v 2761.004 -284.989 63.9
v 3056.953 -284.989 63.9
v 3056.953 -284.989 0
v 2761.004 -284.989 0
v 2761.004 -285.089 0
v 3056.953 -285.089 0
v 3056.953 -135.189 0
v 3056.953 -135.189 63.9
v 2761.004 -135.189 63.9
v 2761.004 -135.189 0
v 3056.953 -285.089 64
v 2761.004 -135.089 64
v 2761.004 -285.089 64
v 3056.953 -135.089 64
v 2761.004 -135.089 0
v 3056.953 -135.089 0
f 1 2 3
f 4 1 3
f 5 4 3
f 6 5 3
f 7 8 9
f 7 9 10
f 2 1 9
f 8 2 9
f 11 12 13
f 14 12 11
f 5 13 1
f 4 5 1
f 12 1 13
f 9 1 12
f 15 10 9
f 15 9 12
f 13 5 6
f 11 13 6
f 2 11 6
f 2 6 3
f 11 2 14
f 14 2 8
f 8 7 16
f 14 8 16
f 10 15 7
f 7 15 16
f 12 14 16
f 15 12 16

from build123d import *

# Parameters (mm, degrees)
SKETCH_1_W          = 295.949422796
SKETCH_1_H          = 458.479579913
EXTRUDE_1_DEPTH     = 64
SKETCH_2_W          = 64
SKETCH_2_H          = 308.479579913
CUT_EXTRUDE_1_DEPTH = 1028.33
SKETCH_3_W          = 63.9
SKETCH_3_H          = 149.8
CUT_EXTRUDE_2_DEPTH = 1028.33


with BuildPart() as part:
    # 스케치1 → 보스-돌출1 (new body)
    with BuildSketch(Plane.XY):
        with Locations((2908.978266494, -55.849619451)):
            Rectangle(SKETCH_1_W, SKETCH_1_H)
    extrude(amount=EXTRUDE_1_DEPTH)

    # 스케치2 → 컷-돌출1 (cut)
    with BuildSketch(Plane(origin=(3056.952977892, 0, 0), x_dir=(0, 0, -1), z_dir=(1, 0, 0))):
        with Locations((-32, 19.150380549)):
            Rectangle(SKETCH_2_W, SKETCH_2_H)
    extrude(amount=-CUT_EXTRUDE_1_DEPTH, mode=Mode.SUBTRACT)

    # 스케치3 → 컷-돌출2 (cut)
    with BuildSketch(Plane(origin=(3056.952977892, 0, 0), x_dir=(0, 0, -1), z_dir=(1, 0, 0))):
        with Locations((-31.95, -210.089409407)):
            Rectangle(SKETCH_3_W, SKETCH_3_H)
    extrude(amount=-CUT_EXTRUDE_2_DEPTH, mode=Mode.SUBTRACT)


solid = part.part
